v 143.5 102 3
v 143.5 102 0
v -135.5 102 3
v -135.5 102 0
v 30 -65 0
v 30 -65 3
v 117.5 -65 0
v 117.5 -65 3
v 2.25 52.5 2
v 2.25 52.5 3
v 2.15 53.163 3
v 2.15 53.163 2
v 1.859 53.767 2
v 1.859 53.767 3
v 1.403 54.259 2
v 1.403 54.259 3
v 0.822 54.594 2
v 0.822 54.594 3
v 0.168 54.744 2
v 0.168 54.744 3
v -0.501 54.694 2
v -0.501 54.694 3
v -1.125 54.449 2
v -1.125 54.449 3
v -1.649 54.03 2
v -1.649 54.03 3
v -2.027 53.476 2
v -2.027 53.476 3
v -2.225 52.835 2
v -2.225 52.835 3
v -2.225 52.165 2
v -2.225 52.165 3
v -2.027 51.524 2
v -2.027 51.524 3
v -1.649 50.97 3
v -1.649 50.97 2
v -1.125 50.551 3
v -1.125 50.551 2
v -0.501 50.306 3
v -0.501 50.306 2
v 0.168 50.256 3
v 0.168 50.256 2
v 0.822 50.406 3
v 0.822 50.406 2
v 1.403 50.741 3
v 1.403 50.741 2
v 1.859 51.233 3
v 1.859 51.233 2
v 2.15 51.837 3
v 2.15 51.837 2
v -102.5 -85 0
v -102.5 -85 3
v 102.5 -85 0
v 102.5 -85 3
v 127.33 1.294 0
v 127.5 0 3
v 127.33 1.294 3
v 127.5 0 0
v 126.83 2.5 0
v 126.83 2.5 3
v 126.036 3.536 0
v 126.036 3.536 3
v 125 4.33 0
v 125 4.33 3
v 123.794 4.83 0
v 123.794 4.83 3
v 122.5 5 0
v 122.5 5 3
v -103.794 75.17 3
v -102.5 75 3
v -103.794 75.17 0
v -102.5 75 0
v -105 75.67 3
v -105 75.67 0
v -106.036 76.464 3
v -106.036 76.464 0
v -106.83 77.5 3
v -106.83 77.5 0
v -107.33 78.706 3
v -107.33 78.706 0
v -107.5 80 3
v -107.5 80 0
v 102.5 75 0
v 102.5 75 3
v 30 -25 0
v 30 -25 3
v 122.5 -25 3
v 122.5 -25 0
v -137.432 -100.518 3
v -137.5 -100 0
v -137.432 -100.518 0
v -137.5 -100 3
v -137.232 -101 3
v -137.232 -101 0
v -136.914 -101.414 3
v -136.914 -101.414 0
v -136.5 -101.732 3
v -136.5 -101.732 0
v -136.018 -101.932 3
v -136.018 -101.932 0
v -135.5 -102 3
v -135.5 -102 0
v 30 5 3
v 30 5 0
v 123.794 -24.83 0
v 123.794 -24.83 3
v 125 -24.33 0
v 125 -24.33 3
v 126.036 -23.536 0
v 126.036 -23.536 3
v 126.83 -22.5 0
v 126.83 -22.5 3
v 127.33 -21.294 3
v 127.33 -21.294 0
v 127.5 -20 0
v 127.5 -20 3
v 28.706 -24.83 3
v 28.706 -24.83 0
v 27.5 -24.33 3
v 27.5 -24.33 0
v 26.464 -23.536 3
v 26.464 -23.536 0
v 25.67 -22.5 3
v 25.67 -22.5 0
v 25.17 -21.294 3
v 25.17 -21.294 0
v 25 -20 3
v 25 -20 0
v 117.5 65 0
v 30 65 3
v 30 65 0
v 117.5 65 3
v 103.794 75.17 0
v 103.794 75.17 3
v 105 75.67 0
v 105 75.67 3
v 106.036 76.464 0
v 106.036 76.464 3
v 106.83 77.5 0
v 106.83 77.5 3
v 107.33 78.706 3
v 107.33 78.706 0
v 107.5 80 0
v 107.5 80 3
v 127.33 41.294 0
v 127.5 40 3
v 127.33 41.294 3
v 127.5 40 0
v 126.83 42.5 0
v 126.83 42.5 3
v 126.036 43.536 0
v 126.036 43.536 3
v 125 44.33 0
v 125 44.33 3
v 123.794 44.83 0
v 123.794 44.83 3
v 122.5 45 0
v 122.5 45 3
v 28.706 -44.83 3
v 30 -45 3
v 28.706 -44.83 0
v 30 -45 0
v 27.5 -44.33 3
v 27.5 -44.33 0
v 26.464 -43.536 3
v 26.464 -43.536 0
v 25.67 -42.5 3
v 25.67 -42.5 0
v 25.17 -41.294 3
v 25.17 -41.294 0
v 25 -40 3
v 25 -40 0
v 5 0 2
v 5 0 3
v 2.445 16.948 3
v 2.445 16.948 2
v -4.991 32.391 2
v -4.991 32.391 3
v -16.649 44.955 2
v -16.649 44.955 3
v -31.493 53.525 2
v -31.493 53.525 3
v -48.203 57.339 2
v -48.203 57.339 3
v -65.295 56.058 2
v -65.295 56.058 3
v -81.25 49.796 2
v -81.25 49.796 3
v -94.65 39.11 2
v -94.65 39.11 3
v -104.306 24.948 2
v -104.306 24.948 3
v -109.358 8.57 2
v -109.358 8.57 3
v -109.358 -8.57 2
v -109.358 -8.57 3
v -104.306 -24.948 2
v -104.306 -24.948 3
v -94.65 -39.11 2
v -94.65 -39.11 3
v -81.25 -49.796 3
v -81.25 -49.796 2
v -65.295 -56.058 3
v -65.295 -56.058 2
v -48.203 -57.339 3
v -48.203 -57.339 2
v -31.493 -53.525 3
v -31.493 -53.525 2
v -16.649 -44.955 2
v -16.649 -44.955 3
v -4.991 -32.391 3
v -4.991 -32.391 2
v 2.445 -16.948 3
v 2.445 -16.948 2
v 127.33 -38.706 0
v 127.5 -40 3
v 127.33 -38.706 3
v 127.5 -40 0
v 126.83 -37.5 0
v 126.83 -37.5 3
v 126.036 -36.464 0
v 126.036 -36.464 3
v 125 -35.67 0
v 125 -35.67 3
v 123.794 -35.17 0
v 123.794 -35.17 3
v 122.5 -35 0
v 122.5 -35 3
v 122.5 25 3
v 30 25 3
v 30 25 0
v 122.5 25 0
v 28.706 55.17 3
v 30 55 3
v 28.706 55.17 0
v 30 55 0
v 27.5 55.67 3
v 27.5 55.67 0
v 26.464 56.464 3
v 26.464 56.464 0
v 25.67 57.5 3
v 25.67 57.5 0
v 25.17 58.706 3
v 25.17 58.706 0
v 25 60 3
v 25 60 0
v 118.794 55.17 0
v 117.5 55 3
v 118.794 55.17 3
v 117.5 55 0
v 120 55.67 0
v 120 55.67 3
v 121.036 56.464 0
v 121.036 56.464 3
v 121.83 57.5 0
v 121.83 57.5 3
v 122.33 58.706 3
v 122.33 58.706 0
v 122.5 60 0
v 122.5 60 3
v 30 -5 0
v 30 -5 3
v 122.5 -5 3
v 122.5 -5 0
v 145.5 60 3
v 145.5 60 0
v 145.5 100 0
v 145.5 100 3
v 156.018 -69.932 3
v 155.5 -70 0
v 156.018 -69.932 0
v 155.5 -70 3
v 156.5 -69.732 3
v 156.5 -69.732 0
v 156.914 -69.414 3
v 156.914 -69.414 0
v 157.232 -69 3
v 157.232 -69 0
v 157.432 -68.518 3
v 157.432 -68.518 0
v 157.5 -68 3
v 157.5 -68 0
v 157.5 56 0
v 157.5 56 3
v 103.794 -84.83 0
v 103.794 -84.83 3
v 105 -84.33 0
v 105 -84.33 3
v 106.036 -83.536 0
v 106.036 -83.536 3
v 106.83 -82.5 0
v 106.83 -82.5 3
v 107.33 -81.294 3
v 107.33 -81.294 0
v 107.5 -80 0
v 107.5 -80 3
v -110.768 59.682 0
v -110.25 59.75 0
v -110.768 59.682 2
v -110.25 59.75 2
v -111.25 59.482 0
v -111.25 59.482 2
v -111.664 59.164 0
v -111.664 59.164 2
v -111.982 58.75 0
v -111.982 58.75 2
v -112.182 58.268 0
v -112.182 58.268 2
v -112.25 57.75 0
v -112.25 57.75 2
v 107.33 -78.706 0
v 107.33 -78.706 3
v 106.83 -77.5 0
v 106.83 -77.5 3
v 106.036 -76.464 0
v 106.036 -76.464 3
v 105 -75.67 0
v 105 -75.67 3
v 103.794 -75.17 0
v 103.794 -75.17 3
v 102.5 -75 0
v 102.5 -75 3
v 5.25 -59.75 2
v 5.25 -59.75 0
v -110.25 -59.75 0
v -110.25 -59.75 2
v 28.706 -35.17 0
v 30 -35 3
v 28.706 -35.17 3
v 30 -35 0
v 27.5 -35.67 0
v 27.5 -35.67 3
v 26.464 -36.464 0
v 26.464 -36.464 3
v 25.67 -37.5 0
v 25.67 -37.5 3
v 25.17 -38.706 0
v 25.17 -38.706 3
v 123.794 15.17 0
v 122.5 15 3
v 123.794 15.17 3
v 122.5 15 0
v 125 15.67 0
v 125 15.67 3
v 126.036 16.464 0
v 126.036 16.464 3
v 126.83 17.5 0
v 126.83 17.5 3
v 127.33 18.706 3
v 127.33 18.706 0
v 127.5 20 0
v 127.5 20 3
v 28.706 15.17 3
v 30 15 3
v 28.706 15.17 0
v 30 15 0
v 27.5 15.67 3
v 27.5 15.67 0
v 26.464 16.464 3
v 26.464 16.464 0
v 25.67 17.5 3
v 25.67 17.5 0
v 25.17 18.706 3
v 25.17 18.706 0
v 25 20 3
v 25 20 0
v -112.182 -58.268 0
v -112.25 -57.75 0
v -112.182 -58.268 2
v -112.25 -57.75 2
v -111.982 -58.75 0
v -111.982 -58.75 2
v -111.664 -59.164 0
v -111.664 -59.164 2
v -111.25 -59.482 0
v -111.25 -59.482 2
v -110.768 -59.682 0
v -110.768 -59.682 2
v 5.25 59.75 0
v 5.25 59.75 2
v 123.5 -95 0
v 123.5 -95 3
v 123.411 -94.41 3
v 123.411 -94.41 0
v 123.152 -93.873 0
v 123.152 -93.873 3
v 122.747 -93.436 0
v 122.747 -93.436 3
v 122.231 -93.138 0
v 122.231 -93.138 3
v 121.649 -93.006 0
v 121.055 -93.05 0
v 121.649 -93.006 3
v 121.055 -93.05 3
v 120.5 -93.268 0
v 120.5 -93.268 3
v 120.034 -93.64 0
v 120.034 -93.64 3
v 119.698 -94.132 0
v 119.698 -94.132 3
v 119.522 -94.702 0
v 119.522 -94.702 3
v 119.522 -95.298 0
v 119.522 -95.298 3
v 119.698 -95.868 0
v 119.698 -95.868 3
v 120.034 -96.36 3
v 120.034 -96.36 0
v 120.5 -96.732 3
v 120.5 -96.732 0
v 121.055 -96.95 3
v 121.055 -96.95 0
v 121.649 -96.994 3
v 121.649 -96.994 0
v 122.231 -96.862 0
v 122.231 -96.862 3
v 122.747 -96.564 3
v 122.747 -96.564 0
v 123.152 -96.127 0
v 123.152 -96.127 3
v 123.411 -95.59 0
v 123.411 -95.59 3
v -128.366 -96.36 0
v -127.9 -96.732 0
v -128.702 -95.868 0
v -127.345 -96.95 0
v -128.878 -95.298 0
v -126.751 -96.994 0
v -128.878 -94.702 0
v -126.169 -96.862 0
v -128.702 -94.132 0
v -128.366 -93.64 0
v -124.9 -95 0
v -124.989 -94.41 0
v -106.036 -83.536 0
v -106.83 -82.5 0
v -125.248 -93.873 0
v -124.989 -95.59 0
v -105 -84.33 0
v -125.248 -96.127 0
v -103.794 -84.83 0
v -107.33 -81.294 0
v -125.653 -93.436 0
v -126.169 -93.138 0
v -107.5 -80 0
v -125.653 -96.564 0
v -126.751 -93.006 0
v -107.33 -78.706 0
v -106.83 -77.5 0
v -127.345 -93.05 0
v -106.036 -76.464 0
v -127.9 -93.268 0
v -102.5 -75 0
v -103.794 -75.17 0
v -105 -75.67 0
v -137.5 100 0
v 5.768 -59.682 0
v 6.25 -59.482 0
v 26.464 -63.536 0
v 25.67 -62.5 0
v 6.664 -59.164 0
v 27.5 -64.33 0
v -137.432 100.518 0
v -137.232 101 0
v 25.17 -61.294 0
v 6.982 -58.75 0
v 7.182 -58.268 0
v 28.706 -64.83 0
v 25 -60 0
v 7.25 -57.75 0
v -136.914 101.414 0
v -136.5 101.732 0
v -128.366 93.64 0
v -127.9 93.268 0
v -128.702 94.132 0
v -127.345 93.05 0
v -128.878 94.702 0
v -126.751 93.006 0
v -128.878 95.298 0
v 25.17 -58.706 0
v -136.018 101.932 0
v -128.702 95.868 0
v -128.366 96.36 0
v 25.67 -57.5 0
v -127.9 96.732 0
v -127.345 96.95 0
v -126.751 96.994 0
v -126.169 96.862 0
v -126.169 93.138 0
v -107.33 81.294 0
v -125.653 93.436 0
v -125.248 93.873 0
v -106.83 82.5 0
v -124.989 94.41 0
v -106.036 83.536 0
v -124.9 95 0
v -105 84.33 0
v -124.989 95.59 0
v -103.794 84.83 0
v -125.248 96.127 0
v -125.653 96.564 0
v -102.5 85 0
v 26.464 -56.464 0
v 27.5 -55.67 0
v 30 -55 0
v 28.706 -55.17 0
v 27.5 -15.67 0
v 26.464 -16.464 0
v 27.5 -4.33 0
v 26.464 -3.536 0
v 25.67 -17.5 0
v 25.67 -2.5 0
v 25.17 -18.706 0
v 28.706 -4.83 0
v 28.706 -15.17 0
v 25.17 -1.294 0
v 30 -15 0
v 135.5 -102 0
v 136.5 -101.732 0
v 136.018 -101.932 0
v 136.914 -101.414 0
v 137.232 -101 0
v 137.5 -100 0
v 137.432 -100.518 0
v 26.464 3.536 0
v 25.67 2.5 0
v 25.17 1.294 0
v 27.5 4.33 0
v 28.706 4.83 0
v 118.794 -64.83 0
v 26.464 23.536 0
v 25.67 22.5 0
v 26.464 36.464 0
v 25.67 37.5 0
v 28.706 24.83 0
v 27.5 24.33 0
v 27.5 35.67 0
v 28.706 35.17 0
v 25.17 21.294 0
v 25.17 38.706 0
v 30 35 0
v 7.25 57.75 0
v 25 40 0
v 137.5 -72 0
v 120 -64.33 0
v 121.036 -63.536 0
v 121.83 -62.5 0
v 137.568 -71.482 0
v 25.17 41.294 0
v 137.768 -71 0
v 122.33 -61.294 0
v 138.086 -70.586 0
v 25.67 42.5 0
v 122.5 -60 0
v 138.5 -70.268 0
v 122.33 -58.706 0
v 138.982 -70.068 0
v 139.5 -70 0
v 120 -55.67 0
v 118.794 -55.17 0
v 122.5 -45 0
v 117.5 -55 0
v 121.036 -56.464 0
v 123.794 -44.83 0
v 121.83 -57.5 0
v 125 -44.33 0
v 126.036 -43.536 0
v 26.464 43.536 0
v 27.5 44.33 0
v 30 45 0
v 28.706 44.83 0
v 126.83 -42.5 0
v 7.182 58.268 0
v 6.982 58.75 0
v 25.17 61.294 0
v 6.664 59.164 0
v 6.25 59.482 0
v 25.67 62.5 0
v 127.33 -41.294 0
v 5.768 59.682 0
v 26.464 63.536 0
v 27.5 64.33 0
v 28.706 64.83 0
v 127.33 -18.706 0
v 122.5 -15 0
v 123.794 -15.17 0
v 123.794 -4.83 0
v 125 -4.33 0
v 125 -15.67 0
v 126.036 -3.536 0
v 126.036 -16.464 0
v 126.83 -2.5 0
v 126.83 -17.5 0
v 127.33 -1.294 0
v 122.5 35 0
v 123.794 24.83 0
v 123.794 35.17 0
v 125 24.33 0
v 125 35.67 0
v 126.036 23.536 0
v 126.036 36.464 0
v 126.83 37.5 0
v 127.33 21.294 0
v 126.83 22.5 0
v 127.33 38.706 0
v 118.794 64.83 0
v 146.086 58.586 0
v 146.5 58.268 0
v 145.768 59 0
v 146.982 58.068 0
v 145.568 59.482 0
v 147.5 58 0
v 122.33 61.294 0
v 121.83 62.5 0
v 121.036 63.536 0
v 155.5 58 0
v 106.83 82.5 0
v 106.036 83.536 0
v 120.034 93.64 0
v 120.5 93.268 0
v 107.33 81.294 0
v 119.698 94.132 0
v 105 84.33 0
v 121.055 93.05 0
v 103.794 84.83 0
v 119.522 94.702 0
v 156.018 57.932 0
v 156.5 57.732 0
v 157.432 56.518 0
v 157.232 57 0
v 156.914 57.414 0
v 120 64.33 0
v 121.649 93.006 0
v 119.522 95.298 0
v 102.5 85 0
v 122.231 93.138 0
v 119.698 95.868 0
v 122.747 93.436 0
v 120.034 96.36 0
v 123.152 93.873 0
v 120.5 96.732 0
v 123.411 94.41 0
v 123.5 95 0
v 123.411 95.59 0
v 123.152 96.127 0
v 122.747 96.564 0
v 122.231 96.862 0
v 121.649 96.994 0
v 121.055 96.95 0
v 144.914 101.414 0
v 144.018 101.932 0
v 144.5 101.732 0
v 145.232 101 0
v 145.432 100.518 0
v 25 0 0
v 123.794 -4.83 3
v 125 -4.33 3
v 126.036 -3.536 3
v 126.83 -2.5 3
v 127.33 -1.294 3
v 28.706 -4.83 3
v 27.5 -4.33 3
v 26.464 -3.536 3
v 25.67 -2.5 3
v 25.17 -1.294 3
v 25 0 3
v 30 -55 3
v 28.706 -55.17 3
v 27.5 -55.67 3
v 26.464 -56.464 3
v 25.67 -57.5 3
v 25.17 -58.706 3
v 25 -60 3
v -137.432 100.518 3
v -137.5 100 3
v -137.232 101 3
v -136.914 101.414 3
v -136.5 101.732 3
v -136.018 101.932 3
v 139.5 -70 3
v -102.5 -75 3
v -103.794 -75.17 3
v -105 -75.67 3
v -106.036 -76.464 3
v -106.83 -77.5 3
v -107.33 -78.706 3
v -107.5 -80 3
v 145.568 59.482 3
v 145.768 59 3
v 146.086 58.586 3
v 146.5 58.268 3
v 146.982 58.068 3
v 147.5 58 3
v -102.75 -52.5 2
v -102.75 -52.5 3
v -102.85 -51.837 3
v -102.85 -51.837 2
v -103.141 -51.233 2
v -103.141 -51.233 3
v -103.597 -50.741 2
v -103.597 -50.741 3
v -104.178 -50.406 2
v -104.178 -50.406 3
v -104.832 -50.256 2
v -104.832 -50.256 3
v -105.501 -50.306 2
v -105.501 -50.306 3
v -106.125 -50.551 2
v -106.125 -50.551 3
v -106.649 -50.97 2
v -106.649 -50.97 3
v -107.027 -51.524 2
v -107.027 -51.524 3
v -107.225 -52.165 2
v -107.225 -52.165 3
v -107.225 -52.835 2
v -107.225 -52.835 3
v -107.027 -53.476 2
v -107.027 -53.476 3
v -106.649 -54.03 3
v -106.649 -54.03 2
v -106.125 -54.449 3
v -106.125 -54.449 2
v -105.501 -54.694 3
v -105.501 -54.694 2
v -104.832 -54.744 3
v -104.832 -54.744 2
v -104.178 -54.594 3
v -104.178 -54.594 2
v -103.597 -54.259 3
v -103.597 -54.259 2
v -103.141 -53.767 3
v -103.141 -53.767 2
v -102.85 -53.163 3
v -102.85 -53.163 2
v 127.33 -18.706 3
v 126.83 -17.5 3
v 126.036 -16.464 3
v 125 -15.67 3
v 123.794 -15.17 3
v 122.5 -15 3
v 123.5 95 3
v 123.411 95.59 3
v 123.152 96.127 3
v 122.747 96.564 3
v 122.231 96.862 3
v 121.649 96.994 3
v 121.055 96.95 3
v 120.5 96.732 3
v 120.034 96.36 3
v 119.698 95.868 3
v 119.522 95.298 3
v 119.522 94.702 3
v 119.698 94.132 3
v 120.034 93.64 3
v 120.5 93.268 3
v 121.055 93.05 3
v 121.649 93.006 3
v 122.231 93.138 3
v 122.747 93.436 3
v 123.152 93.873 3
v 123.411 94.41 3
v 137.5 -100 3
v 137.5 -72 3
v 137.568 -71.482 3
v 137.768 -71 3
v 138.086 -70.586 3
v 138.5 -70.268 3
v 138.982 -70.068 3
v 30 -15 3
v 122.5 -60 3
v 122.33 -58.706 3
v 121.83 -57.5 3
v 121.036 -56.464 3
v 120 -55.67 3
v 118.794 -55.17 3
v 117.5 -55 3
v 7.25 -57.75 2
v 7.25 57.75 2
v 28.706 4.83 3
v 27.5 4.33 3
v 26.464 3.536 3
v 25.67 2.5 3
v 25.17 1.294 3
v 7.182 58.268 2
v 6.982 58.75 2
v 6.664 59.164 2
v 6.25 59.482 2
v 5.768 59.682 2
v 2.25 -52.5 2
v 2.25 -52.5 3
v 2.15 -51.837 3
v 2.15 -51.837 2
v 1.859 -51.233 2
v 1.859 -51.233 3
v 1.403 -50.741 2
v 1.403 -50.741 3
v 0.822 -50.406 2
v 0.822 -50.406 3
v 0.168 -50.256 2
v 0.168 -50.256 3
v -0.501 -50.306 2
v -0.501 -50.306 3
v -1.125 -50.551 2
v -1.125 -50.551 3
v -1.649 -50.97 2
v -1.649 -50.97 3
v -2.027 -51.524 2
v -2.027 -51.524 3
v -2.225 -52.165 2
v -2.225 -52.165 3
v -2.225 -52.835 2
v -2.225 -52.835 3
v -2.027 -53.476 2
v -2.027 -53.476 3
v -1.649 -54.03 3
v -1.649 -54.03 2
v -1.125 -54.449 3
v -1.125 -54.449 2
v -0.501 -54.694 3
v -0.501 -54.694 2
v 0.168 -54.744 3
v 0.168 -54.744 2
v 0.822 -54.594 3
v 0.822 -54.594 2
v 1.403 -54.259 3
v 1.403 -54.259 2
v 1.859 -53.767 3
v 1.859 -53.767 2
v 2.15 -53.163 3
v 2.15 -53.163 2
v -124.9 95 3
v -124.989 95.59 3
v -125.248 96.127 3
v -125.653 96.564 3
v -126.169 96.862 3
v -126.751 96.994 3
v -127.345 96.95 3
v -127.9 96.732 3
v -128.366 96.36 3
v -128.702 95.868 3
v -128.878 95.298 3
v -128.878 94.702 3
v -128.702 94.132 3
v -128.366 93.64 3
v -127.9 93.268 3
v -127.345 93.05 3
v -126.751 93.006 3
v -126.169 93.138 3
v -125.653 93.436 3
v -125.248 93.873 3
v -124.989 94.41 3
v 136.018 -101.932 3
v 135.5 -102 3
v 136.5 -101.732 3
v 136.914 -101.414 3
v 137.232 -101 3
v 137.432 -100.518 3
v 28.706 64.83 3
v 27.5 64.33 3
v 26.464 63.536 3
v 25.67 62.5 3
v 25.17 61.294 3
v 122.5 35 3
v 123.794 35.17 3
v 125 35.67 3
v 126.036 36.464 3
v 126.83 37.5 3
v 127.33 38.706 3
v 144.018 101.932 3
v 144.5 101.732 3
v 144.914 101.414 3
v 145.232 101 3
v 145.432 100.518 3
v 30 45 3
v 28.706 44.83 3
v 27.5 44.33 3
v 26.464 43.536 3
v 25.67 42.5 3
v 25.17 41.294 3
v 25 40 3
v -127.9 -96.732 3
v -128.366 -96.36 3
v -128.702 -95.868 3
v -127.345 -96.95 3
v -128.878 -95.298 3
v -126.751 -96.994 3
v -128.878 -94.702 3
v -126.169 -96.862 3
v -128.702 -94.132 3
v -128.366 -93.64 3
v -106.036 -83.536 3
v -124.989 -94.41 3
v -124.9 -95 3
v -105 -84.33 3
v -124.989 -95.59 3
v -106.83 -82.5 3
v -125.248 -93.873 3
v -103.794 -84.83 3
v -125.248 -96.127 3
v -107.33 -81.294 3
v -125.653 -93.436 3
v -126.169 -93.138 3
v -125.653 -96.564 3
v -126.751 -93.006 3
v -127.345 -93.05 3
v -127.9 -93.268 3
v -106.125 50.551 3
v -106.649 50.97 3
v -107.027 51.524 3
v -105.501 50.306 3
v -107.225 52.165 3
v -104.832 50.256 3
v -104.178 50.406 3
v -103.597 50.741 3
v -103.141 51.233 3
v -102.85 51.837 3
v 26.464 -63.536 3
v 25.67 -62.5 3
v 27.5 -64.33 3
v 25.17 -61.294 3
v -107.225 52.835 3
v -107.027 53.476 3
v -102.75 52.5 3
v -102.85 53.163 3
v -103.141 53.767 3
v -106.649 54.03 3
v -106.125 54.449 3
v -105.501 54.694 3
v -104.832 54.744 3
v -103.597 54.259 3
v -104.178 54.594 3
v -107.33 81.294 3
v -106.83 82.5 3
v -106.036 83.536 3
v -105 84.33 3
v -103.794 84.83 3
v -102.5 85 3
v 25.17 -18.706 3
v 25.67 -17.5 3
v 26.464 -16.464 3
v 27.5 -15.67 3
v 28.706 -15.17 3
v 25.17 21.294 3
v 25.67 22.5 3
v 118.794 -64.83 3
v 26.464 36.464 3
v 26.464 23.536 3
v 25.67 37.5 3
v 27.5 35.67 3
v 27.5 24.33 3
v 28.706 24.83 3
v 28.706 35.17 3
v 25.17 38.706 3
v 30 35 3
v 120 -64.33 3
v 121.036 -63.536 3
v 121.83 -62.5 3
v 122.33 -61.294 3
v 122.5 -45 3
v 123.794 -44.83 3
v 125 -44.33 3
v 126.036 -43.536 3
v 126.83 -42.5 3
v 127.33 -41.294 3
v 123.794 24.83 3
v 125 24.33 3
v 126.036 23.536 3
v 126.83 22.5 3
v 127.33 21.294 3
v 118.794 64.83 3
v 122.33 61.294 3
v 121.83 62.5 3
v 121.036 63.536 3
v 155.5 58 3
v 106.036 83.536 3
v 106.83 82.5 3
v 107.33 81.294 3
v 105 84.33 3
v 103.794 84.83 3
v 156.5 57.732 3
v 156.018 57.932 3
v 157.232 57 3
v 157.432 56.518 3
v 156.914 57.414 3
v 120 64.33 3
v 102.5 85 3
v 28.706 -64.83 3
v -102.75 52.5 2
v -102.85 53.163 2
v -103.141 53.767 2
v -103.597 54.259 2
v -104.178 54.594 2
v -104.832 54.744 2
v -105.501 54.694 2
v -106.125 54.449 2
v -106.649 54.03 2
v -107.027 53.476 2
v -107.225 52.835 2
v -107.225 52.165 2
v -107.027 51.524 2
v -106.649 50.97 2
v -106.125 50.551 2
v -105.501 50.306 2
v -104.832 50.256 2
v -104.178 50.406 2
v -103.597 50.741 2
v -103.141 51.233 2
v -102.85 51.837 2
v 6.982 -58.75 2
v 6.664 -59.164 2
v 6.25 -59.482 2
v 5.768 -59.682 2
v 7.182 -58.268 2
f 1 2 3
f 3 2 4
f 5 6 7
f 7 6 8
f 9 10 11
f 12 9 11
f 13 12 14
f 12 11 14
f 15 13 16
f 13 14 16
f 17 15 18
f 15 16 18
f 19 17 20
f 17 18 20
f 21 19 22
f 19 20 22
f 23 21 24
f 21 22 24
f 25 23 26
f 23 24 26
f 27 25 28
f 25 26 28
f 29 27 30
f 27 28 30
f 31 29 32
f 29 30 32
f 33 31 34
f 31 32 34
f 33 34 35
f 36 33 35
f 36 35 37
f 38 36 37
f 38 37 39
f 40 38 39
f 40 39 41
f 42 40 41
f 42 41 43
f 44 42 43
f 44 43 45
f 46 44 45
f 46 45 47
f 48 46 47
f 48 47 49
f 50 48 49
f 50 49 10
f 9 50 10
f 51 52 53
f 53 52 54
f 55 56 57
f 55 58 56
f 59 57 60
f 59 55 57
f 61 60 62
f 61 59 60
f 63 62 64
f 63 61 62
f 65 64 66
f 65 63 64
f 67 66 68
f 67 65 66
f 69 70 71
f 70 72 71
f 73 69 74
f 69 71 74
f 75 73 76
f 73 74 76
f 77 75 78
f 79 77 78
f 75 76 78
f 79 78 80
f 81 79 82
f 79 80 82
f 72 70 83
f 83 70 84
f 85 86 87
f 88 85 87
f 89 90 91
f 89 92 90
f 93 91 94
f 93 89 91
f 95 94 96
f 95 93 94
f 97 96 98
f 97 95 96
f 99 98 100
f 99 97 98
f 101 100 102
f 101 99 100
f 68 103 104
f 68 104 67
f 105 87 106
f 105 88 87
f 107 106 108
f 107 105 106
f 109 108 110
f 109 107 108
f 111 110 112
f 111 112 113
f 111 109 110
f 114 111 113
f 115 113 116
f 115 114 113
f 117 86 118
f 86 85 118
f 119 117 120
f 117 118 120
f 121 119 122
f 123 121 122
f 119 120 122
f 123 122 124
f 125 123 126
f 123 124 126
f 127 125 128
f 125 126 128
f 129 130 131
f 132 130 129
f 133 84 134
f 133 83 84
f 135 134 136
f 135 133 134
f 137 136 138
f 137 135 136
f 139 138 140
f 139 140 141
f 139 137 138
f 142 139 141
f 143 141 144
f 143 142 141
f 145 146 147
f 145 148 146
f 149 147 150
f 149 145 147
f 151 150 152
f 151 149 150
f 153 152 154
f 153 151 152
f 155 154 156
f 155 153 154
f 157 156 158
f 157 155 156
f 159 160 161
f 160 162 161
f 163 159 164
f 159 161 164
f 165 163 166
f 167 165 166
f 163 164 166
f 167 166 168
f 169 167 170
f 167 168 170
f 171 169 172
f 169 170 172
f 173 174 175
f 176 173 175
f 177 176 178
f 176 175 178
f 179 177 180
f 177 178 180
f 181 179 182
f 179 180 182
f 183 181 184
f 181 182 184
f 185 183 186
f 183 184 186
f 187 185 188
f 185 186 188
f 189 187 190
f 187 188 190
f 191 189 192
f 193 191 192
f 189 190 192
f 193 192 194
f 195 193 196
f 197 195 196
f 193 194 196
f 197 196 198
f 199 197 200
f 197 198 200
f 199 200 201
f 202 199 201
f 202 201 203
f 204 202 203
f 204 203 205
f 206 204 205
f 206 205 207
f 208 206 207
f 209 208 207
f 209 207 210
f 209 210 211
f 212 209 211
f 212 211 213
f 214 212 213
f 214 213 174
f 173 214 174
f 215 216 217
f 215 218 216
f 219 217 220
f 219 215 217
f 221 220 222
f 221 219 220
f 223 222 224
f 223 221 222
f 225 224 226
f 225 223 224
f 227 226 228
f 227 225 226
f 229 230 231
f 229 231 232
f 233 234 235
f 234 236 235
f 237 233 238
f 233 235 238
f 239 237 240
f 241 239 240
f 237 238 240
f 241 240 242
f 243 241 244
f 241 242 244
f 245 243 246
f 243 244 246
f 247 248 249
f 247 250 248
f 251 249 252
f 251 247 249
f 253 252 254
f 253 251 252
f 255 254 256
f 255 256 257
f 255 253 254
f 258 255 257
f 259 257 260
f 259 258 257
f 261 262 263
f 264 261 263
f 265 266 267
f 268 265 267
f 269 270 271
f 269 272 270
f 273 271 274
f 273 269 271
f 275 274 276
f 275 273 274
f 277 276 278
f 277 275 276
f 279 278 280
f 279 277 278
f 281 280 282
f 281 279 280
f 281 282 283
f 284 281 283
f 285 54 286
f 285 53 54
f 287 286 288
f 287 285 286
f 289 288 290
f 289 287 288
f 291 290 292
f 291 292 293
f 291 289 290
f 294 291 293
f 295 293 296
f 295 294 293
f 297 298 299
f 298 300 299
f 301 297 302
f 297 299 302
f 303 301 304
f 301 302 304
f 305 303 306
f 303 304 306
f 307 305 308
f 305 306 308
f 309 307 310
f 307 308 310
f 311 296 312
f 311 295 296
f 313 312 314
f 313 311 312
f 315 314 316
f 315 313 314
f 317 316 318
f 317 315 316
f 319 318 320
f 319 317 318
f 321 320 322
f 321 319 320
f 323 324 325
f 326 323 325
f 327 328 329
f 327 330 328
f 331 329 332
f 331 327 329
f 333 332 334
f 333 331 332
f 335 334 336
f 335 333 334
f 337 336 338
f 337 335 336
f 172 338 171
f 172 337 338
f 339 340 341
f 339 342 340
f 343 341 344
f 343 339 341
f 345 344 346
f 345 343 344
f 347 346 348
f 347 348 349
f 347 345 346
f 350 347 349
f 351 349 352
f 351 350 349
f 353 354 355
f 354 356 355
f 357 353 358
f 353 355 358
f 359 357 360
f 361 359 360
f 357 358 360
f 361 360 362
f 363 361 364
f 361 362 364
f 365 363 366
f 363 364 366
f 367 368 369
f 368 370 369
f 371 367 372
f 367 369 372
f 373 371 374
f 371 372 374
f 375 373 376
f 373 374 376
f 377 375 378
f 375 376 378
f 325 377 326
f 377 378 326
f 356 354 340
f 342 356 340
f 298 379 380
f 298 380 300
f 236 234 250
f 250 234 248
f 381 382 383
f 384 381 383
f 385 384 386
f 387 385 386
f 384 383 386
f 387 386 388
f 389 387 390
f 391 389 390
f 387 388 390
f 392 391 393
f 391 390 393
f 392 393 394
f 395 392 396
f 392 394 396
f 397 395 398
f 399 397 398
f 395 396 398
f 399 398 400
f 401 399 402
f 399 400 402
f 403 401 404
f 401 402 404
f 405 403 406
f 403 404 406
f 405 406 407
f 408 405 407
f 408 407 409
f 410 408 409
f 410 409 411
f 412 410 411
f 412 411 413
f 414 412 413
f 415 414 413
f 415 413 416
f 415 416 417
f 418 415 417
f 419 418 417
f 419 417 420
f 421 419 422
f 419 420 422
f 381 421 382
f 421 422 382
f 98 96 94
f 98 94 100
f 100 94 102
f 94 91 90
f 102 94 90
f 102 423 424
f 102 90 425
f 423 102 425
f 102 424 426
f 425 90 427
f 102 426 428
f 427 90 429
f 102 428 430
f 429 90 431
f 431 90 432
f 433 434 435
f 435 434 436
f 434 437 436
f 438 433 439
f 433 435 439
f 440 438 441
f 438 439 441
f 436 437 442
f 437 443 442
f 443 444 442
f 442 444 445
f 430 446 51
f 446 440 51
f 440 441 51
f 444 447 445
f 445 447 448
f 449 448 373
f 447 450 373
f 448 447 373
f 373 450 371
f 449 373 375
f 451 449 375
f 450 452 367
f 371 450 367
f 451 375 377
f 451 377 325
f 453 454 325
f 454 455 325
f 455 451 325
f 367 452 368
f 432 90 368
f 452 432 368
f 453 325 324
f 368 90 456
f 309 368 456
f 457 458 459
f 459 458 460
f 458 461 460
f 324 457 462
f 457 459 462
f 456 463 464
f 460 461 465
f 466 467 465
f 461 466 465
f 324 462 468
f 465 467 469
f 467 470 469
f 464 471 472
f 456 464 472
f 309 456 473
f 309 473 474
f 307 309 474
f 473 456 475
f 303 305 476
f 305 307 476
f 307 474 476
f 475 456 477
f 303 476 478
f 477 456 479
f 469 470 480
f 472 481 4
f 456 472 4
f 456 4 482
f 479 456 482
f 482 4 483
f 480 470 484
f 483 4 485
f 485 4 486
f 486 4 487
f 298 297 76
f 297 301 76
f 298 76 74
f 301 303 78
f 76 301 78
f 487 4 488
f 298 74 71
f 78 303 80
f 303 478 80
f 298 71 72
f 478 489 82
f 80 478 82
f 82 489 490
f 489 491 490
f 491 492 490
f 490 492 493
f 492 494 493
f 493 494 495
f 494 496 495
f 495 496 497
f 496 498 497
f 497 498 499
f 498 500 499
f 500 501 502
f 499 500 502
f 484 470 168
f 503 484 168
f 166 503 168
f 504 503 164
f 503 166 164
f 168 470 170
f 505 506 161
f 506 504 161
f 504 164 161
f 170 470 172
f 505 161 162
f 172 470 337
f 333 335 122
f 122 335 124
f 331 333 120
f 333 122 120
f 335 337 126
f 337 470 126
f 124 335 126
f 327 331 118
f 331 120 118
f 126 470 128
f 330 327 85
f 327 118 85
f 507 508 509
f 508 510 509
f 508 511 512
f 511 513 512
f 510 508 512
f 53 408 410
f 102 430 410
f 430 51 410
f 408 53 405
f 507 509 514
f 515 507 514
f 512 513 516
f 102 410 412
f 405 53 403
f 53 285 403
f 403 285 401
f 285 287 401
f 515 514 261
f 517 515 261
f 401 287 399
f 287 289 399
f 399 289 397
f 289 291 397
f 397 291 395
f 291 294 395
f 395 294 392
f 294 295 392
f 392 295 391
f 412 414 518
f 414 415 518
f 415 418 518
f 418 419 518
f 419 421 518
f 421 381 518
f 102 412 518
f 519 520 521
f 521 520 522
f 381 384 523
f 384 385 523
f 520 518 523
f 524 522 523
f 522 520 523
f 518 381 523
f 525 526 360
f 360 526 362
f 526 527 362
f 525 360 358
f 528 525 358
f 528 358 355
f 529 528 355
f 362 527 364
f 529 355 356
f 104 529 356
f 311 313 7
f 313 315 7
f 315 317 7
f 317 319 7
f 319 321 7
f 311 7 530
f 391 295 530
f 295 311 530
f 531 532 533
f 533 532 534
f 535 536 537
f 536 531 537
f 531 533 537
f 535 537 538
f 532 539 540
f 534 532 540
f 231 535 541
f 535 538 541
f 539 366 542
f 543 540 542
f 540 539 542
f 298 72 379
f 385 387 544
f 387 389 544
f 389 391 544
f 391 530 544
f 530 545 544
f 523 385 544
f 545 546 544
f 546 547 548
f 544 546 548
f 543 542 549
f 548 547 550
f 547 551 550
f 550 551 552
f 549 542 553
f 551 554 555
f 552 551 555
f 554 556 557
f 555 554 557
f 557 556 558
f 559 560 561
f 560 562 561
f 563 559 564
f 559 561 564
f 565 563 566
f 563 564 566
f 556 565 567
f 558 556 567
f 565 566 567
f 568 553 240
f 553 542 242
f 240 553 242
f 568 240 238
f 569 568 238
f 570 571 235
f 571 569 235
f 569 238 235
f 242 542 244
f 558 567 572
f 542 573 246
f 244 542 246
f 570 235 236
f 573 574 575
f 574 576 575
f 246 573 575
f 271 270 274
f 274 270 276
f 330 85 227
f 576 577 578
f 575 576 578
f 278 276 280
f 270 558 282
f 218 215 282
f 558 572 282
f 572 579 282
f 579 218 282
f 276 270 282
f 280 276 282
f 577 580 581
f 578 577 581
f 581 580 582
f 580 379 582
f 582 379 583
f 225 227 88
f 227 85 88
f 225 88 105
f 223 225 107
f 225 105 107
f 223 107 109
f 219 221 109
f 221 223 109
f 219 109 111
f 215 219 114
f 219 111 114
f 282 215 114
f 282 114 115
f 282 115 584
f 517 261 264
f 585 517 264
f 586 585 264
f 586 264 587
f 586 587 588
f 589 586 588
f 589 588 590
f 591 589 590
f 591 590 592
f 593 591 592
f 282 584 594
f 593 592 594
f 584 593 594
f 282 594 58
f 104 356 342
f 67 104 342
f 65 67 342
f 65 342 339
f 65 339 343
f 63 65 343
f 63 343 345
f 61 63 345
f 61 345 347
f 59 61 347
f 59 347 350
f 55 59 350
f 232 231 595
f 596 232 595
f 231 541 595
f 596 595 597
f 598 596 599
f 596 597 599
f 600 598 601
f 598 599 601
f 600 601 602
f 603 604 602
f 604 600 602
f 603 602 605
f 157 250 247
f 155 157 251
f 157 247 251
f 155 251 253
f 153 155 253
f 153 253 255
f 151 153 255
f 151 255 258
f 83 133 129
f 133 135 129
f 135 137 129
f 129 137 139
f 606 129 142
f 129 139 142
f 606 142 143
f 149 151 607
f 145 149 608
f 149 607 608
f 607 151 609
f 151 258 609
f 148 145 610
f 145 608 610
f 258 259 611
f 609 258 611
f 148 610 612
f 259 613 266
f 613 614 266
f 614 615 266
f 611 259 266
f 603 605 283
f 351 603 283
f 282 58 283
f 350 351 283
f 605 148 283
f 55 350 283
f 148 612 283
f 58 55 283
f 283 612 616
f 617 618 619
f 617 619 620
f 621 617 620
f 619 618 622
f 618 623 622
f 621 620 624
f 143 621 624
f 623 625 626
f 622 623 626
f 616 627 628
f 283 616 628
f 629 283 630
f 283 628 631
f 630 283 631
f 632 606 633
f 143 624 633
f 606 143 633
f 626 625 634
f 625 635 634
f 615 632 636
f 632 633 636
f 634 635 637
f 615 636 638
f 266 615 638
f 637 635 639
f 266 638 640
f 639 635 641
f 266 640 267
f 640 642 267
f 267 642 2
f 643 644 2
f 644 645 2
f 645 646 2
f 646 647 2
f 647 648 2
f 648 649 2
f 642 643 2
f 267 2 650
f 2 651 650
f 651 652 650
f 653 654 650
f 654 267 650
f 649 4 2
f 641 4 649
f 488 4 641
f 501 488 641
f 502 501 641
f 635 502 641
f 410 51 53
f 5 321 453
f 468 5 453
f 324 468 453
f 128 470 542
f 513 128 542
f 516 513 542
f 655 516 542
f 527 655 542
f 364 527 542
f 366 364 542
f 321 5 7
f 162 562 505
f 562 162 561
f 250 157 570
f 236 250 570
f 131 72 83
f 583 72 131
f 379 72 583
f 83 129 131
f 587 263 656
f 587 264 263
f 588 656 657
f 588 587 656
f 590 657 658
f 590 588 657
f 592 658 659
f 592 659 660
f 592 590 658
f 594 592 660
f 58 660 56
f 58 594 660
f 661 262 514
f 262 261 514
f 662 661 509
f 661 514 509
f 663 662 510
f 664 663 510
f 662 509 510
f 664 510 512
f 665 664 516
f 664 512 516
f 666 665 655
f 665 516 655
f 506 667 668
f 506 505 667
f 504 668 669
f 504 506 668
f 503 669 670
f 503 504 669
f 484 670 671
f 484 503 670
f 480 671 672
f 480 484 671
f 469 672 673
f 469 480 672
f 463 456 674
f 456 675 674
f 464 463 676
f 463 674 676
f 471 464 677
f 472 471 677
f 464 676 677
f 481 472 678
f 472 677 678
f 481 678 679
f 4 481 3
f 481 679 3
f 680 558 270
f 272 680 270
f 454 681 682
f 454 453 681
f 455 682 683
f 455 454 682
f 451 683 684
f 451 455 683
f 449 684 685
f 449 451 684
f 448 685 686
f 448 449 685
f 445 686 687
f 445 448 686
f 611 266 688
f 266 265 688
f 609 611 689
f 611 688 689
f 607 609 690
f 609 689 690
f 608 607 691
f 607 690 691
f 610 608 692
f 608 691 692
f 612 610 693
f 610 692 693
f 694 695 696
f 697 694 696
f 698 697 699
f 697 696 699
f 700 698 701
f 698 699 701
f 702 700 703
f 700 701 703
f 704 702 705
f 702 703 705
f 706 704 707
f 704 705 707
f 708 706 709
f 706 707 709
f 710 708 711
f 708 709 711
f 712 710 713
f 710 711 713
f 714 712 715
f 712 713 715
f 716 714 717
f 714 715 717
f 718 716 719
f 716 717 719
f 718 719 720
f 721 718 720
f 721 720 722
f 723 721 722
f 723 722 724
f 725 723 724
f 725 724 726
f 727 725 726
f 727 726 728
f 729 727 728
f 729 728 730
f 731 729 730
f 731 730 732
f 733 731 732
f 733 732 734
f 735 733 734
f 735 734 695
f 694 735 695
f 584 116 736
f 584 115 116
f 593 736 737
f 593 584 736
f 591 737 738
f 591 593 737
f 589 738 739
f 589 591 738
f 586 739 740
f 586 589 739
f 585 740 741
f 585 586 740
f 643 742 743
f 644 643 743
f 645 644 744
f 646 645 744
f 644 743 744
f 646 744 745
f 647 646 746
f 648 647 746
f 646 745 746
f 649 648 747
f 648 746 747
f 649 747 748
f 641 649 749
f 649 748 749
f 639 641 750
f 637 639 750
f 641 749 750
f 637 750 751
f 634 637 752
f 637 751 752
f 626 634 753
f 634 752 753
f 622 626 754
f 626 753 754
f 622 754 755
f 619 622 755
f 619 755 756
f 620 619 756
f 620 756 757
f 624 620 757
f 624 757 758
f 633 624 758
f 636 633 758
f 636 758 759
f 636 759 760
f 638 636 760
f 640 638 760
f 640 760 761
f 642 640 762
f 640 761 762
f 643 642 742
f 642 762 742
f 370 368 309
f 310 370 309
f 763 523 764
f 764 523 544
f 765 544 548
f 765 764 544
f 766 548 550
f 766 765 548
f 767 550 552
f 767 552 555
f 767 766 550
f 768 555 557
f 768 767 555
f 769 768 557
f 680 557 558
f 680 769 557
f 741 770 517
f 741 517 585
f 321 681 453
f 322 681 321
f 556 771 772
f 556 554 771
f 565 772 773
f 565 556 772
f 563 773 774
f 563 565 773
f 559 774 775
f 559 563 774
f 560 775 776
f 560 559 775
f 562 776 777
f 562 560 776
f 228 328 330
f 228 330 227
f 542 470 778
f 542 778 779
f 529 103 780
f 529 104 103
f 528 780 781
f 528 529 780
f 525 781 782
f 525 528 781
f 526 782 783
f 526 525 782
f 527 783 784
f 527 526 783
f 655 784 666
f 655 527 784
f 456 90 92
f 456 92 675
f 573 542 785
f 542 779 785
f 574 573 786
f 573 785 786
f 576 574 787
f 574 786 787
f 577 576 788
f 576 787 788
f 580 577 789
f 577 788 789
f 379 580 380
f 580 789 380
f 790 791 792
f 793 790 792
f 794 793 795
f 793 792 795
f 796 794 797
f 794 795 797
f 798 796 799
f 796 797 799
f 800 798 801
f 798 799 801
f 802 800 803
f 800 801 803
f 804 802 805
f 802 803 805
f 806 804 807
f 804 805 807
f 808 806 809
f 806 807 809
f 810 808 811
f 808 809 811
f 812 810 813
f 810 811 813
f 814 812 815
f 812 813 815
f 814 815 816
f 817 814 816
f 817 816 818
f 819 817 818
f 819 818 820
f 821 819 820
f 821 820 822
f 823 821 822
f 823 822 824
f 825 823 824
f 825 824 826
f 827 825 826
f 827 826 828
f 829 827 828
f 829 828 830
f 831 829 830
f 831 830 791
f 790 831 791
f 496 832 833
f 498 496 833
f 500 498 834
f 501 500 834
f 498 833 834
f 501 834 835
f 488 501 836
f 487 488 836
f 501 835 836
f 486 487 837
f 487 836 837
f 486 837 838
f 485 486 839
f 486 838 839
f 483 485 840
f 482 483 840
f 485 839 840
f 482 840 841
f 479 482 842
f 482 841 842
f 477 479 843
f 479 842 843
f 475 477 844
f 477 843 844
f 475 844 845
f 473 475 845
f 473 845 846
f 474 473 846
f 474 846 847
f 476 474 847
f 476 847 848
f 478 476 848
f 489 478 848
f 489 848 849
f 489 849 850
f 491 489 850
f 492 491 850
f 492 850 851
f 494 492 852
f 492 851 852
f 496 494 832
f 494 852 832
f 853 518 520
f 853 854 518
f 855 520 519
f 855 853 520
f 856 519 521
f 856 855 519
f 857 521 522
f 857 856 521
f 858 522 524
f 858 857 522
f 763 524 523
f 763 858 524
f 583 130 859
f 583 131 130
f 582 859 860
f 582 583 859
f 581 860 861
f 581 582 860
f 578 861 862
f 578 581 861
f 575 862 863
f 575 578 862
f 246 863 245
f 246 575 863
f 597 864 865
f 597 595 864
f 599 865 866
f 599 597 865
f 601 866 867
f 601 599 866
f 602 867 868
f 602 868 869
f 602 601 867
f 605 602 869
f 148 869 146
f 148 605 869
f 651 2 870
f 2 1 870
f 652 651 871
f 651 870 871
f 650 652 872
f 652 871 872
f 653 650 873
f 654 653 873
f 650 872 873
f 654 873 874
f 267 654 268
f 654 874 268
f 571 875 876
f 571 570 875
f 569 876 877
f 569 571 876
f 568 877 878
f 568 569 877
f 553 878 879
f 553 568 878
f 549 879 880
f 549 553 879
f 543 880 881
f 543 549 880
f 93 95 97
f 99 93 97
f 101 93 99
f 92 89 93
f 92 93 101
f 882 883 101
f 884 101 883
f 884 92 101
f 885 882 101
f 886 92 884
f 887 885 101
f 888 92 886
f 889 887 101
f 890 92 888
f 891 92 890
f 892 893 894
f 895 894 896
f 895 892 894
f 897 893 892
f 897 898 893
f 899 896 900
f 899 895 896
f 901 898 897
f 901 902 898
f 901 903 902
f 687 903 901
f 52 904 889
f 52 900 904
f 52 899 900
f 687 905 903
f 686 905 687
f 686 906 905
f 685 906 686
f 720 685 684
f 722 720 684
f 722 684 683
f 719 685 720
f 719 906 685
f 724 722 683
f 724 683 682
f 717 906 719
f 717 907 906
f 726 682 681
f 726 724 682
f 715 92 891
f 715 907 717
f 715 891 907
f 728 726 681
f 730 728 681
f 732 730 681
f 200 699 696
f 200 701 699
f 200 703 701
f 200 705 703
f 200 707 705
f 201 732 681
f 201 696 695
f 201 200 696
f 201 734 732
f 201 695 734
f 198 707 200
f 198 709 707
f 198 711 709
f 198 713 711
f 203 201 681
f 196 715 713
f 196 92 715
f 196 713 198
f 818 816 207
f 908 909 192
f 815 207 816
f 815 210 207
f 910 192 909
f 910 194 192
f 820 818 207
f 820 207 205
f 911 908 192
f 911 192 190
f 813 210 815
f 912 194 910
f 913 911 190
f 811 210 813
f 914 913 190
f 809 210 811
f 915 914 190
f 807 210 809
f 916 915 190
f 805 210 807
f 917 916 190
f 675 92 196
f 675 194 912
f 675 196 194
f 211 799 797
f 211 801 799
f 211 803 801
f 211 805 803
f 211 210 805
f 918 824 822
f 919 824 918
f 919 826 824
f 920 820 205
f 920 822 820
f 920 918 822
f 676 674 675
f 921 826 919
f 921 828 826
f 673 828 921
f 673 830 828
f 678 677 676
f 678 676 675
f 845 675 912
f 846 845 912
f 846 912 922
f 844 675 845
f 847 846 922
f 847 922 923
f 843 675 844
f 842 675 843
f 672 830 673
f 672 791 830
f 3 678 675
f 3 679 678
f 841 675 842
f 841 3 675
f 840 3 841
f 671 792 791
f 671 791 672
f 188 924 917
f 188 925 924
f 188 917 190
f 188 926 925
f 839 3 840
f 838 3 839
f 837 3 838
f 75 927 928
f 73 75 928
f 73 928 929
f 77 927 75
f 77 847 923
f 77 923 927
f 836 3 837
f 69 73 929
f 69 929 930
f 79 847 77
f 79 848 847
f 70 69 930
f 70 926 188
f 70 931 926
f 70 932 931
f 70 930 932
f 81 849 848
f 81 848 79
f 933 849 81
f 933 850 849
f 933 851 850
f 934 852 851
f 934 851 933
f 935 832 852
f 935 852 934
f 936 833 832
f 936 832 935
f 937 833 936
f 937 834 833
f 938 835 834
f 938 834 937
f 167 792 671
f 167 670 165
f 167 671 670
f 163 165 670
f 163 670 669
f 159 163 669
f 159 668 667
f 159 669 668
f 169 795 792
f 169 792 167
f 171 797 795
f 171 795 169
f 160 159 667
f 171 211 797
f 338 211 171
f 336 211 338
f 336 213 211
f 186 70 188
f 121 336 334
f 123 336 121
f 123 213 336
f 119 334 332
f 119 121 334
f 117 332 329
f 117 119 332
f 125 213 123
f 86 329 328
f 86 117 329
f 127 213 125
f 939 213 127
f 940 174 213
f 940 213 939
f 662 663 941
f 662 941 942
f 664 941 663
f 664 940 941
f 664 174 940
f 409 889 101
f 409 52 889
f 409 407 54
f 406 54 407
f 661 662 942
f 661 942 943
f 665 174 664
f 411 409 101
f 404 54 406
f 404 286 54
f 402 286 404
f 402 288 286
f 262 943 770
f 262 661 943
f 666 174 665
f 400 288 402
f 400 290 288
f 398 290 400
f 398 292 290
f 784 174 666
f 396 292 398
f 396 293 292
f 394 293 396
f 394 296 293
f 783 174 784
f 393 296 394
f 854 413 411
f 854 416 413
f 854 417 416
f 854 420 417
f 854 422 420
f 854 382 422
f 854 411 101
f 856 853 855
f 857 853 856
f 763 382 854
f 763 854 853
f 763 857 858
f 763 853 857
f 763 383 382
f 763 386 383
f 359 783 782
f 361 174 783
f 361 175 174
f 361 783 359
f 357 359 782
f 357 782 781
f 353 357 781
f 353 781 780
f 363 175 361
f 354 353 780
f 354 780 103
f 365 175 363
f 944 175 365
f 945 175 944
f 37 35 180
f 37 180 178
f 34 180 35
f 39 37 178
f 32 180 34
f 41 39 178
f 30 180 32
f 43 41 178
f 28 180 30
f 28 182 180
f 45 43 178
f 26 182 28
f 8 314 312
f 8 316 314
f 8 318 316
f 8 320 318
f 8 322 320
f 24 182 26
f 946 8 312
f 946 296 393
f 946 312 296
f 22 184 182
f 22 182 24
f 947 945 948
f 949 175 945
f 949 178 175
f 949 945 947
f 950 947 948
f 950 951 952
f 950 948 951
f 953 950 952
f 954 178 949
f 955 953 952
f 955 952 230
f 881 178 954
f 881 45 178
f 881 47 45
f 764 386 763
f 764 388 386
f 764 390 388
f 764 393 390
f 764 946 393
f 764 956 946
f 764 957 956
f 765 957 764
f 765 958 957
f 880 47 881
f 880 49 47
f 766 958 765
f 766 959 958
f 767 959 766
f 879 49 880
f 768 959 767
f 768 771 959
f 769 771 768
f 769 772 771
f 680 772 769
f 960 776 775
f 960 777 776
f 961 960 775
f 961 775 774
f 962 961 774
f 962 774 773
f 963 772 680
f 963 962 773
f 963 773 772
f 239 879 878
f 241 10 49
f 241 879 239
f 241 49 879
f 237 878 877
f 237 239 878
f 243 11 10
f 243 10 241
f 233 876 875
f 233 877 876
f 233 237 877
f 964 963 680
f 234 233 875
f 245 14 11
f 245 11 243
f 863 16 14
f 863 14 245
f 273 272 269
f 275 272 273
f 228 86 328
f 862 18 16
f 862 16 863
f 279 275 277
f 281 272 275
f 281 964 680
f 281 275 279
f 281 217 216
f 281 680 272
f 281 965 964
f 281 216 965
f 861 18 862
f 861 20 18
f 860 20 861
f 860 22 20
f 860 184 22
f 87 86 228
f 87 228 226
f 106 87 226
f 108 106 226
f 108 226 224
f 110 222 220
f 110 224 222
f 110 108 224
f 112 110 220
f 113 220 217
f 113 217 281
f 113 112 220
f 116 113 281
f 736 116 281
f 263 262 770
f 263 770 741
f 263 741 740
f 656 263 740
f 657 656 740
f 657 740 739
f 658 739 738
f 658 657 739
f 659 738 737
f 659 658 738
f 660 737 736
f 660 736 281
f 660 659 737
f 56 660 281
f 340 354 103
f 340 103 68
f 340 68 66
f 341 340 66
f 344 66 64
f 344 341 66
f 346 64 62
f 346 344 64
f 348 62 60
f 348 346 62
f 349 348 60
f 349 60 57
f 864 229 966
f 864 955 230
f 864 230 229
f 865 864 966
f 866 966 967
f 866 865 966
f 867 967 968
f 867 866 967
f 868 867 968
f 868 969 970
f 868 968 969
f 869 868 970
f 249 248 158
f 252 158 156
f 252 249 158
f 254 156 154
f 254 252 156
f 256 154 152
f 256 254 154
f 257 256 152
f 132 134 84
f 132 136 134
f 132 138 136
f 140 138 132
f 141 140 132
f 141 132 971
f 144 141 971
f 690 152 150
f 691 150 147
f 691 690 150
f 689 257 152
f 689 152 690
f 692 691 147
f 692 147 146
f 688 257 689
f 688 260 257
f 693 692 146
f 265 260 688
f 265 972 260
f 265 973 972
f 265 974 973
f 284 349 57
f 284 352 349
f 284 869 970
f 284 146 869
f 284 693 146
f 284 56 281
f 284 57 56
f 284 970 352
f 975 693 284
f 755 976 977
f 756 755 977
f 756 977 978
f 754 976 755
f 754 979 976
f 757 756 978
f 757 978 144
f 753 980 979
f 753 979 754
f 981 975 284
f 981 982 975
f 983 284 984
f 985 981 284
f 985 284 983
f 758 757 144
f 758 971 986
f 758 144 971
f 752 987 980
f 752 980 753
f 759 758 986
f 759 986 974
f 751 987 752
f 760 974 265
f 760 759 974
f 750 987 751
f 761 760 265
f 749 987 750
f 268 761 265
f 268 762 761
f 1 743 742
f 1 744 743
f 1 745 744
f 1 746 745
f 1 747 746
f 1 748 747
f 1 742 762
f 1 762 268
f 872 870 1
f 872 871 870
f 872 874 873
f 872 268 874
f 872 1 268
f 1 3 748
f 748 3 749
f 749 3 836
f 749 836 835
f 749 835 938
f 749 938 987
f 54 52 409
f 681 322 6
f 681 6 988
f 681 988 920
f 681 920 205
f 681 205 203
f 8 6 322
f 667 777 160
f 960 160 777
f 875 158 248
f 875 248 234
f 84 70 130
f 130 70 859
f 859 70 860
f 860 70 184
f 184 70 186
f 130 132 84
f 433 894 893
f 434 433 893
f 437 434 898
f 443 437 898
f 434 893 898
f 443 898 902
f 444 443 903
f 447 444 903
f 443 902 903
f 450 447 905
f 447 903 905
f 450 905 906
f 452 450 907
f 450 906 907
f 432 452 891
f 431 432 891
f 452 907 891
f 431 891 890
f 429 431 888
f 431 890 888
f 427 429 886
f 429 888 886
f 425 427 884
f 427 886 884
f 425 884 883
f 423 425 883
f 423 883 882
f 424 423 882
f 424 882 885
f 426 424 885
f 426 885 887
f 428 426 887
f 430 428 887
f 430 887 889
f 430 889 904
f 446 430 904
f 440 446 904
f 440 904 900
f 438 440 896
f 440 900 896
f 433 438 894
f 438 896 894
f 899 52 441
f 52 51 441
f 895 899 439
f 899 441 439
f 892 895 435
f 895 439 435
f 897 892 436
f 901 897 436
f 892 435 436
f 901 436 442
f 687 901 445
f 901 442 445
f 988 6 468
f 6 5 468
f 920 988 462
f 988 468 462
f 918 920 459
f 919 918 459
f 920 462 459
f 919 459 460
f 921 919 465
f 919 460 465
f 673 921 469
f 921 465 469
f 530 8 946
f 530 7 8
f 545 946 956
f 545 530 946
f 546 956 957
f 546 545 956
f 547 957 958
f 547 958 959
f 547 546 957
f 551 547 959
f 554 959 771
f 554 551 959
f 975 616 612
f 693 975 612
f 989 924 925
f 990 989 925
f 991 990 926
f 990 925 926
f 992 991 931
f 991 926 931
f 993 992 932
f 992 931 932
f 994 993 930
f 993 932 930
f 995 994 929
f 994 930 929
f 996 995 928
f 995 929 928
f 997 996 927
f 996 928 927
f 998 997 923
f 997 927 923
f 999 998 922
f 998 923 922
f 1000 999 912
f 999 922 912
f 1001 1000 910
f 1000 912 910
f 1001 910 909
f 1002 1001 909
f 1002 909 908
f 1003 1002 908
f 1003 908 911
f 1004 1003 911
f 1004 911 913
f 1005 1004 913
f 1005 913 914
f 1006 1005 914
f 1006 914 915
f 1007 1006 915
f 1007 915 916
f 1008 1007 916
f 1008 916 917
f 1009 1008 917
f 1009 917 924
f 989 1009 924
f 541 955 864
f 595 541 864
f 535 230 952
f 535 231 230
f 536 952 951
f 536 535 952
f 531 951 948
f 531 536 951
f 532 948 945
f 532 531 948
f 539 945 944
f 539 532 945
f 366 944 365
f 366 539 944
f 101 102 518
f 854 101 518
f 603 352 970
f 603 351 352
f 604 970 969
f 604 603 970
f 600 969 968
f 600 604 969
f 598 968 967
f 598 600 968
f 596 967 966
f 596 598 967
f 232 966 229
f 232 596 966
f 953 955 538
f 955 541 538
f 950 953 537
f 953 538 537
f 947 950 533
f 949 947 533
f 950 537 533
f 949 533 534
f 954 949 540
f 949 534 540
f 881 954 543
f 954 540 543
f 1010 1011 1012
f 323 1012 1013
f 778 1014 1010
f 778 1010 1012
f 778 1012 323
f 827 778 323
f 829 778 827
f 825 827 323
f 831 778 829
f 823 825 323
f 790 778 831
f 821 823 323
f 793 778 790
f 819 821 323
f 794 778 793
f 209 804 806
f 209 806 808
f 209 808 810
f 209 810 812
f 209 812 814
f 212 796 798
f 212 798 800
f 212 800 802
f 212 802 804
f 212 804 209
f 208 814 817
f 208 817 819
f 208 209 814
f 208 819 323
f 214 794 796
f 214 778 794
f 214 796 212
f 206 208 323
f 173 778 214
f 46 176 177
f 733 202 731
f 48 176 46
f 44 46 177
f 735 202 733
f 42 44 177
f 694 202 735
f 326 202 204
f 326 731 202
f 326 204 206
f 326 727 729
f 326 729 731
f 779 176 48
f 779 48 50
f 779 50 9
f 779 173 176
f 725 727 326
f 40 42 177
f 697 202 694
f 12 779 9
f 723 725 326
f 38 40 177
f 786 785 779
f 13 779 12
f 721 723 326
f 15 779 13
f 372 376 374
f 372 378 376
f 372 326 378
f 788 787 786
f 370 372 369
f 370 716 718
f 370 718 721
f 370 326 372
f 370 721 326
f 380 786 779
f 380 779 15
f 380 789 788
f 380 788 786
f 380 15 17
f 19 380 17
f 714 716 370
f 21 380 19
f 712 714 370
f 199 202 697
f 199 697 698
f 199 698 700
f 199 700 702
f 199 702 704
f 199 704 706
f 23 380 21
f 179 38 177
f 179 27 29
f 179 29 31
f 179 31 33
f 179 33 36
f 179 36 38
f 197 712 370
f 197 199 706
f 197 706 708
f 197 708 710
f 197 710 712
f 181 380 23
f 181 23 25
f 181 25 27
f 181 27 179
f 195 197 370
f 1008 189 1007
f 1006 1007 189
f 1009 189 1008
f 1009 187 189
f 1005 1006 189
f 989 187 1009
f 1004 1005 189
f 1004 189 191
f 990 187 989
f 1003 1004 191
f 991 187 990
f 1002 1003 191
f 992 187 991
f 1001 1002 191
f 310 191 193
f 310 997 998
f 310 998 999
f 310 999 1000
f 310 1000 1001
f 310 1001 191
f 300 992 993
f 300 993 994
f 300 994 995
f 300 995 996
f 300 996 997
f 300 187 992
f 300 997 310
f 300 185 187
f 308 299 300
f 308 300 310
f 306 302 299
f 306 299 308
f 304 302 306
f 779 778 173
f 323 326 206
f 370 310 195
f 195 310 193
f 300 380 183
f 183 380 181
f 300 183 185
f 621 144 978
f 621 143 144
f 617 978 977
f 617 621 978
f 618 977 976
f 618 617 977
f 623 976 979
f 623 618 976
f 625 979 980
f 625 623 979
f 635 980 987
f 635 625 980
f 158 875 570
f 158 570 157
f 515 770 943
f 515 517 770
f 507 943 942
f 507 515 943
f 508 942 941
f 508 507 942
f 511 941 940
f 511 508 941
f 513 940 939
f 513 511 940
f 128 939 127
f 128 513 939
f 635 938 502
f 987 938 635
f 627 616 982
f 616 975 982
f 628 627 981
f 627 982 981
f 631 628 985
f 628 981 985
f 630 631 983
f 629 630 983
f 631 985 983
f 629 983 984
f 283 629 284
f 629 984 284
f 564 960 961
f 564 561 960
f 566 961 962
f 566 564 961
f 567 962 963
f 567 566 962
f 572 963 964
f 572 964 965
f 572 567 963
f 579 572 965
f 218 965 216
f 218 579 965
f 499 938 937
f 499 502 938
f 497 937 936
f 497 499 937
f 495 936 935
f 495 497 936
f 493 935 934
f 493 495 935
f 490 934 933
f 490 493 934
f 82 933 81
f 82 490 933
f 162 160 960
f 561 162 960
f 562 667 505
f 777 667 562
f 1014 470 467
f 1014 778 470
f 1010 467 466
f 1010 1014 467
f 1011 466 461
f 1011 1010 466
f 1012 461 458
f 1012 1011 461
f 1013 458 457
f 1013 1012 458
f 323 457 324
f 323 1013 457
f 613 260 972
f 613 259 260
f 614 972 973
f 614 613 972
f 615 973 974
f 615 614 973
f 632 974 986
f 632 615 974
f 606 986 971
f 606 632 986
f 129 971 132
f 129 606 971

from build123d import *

# Parameters (mm, degrees)
SKETCH_1_W            = 275
SKETCH_1_H            = 204
SKETCH_1_W_2          = 8
SKETCH_1_H_2          = 44
EXTRUDE_1_DEPTH       = 3
SKETCH_2_R            = 2
SKETCH_2_R_2          = 57.5
SKETCH_2_R_3          = 2.25
CUT_EXTRUDE_1_DEPTH   = 3
SKETCH_3_W            = 119.5
SKETCH_3_H            = 119.5
CUT_EXTRUDE_2_DEPTH   = 2
FILLET_1_R            = 2
SKETCH_5_W            = 215
SKETCH_5_H            = 10
SKETCH_5_W_2          = 97.5
SKETCH_5_W_3          = 102.5
CUT_EXTRUDE_1_2_DEPTH = 3
FILLET_2_R            = 5
FILLET_3_R            = 2


with BuildPart() as part:
    # 스케치1 → 보스-돌출1 (new body)
    with BuildSketch(Plane.XY):
        Rectangle(SKETCH_1_W, SKETCH_1_H)
        Polygon((137.5, 58), (137.5, -70), (157.5, -70), (157.5, 58), (145.5, 58), align=None)
        with Locations((141.5, 80)):
            Rectangle(SKETCH_1_W_2, SKETCH_1_H_2)
    extrude(amount=EXTRUDE_1_DEPTH)

    # 스케치2 → Cut-Extrude 1 (cut)
    with BuildSketch(Plane.XY.offset(3)):
        with Locations((-126.9, 95)):
            Circle(SKETCH_2_R)
        with Locations((121.5, 95)):
            Circle(SKETCH_2_R)
        with Locations((-126.9, -95)):
            Circle(SKETCH_2_R)
        with Locations((121.5, -95)):
            Circle(SKETCH_2_R)
        with Locations((-52.5, 0)):
            Circle(SKETCH_2_R_2)
        with Locations((-105, 52.5)):
            Circle(SKETCH_2_R_3)
        with Locations((0, 52.5)):
            Circle(SKETCH_2_R_3)
        with Locations((0, -52.5)):
            Circle(SKETCH_2_R_3)
        with Locations((-105, -52.5)):
            Circle(SKETCH_2_R_3)
    extrude(amount=-CUT_EXTRUDE_1_DEPTH, mode=Mode.SUBTRACT)

    # 스케치3 → 컷-돌출2 (cut)
    with BuildSketch(Plane(origin=(0, 0, 0), x_dir=(-1, 0, 0), z_dir=(0, 0, -1))):
        with Locations((52.5, 0)):
            Rectangle(SKETCH_3_W, SKETCH_3_H)
    extrude(amount=-CUT_EXTRUDE_2_DEPTH, mode=Mode.SUBTRACT)

    # 필렛1
    fillet_1_edges = [part.edges().sort_by_distance(p)[0] for p in [
        (7.25, 59.75, 1),
        (-112.25, 59.75, 1),
        (-112.25, -59.75, 1),
        (7.25, -59.75, 1),
    ]]
    fillet(fillet_1_edges, radius=FILLET_1_R)

    # 스케치5 → Cut-Extrude 1 2 (cut)
    with BuildSketch(Plane.XY.offset(3)):
        with Locations((0, -80)):
            Rectangle(SKETCH_5_W, SKETCH_5_H)
        with Locations((73.75, -60)):
            Rectangle(SKETCH_5_W_2, SKETCH_5_H)
        with Locations((76.25, -40)):
            Rectangle(SKETCH_5_W_3, SKETCH_5_H)
        with Locations((76.25, -20)):
            Rectangle(SKETCH_5_W_3, SKETCH_5_H)
        with Locations((76.25, 0)):
            Rectangle(SKETCH_5_W_3, SKETCH_5_H)
        with Locations((76.25, 20)):
            Rectangle(SKETCH_5_W_3, SKETCH_5_H)
        with Locations((76.25, 40)):
            Rectangle(SKETCH_5_W_3, SKETCH_5_H)
        with Locations((73.75, 60)):
            Rectangle(SKETCH_5_W_2, SKETCH_5_H)
        with Locations((0, 80)):
            Rectangle(SKETCH_5_W, SKETCH_5_H)
    extrude(amount=-CUT_EXTRUDE_1_2_DEPTH, mode=Mode.SUBTRACT)

    # 필렛2
    fillet_2_edges = [part.edges().sort_by_distance(p)[0] for p in [
        (107.5, -85, 1.5),
        (122.5, -65, 1.5),
        (127.5, -45, 1.5),
        (127.5, -25, 1.5),
        (127.5, -5, 1.5),
        (127.5, 15, 1.5),
        (127.5, 35, 1.5),
        (122.5, 55, 1.5),
        (107.5, 75, 1.5),
        (25, 65, 1.5),
        (25, 45, 1.5),
        (25, 25, 1.5),
        (25, 5, 1.5),
        (25, -15, 1.5),
        (25, -35, 1.5),
        (25, -55, 1.5),
        (-107.5, -75, 1.5),
        (25, -65, 1.5),
        (25, -45, 1.5),
        (25, -25, 1.5),
        (25, -5, 1.5),
        (25, 15, 1.5),
        (25, 35, 1.5),
        (25, 55, 1.5),
        (-107.5, -85, 1.5),
        (127.5, 5, 1.5),
        (127.5, -15, 1.5),
        (127.5, -35, 1.5),
        (122.5, -55, 1.5),
        (107.5, -75, 1.5),
        (127.5, 25, 1.5),
        (122.5, 65, 1.5),
        (127.5, 45, 1.5),
        (107.5, 85, 1.5),
        (-107.5, 75, 1.5),
        (-107.5, 85, 1.5),
    ]]
    fillet(fillet_2_edges, radius=FILLET_2_R - 0.0001)  # a hair under: the kernel refuses the full size

    # 필렛3
    fillet_3_edges = [part.edges().sort_by_distance(p)[0] for p in [
        (157.5, 58, 1.5),
        (157.5, -70, 1.5),
        (137.5, -70, 1.5),
        (137.5, -102, 1.5),
        (-137.5, -102, 1.5),
        (-137.5, 102, 1.5),
        (145.5, 102, 1.5),
        (145.5, 58, 1.5),
    ]]
    fillet(fillet_3_edges, radius=FILLET_3_R)


solid = part.part
